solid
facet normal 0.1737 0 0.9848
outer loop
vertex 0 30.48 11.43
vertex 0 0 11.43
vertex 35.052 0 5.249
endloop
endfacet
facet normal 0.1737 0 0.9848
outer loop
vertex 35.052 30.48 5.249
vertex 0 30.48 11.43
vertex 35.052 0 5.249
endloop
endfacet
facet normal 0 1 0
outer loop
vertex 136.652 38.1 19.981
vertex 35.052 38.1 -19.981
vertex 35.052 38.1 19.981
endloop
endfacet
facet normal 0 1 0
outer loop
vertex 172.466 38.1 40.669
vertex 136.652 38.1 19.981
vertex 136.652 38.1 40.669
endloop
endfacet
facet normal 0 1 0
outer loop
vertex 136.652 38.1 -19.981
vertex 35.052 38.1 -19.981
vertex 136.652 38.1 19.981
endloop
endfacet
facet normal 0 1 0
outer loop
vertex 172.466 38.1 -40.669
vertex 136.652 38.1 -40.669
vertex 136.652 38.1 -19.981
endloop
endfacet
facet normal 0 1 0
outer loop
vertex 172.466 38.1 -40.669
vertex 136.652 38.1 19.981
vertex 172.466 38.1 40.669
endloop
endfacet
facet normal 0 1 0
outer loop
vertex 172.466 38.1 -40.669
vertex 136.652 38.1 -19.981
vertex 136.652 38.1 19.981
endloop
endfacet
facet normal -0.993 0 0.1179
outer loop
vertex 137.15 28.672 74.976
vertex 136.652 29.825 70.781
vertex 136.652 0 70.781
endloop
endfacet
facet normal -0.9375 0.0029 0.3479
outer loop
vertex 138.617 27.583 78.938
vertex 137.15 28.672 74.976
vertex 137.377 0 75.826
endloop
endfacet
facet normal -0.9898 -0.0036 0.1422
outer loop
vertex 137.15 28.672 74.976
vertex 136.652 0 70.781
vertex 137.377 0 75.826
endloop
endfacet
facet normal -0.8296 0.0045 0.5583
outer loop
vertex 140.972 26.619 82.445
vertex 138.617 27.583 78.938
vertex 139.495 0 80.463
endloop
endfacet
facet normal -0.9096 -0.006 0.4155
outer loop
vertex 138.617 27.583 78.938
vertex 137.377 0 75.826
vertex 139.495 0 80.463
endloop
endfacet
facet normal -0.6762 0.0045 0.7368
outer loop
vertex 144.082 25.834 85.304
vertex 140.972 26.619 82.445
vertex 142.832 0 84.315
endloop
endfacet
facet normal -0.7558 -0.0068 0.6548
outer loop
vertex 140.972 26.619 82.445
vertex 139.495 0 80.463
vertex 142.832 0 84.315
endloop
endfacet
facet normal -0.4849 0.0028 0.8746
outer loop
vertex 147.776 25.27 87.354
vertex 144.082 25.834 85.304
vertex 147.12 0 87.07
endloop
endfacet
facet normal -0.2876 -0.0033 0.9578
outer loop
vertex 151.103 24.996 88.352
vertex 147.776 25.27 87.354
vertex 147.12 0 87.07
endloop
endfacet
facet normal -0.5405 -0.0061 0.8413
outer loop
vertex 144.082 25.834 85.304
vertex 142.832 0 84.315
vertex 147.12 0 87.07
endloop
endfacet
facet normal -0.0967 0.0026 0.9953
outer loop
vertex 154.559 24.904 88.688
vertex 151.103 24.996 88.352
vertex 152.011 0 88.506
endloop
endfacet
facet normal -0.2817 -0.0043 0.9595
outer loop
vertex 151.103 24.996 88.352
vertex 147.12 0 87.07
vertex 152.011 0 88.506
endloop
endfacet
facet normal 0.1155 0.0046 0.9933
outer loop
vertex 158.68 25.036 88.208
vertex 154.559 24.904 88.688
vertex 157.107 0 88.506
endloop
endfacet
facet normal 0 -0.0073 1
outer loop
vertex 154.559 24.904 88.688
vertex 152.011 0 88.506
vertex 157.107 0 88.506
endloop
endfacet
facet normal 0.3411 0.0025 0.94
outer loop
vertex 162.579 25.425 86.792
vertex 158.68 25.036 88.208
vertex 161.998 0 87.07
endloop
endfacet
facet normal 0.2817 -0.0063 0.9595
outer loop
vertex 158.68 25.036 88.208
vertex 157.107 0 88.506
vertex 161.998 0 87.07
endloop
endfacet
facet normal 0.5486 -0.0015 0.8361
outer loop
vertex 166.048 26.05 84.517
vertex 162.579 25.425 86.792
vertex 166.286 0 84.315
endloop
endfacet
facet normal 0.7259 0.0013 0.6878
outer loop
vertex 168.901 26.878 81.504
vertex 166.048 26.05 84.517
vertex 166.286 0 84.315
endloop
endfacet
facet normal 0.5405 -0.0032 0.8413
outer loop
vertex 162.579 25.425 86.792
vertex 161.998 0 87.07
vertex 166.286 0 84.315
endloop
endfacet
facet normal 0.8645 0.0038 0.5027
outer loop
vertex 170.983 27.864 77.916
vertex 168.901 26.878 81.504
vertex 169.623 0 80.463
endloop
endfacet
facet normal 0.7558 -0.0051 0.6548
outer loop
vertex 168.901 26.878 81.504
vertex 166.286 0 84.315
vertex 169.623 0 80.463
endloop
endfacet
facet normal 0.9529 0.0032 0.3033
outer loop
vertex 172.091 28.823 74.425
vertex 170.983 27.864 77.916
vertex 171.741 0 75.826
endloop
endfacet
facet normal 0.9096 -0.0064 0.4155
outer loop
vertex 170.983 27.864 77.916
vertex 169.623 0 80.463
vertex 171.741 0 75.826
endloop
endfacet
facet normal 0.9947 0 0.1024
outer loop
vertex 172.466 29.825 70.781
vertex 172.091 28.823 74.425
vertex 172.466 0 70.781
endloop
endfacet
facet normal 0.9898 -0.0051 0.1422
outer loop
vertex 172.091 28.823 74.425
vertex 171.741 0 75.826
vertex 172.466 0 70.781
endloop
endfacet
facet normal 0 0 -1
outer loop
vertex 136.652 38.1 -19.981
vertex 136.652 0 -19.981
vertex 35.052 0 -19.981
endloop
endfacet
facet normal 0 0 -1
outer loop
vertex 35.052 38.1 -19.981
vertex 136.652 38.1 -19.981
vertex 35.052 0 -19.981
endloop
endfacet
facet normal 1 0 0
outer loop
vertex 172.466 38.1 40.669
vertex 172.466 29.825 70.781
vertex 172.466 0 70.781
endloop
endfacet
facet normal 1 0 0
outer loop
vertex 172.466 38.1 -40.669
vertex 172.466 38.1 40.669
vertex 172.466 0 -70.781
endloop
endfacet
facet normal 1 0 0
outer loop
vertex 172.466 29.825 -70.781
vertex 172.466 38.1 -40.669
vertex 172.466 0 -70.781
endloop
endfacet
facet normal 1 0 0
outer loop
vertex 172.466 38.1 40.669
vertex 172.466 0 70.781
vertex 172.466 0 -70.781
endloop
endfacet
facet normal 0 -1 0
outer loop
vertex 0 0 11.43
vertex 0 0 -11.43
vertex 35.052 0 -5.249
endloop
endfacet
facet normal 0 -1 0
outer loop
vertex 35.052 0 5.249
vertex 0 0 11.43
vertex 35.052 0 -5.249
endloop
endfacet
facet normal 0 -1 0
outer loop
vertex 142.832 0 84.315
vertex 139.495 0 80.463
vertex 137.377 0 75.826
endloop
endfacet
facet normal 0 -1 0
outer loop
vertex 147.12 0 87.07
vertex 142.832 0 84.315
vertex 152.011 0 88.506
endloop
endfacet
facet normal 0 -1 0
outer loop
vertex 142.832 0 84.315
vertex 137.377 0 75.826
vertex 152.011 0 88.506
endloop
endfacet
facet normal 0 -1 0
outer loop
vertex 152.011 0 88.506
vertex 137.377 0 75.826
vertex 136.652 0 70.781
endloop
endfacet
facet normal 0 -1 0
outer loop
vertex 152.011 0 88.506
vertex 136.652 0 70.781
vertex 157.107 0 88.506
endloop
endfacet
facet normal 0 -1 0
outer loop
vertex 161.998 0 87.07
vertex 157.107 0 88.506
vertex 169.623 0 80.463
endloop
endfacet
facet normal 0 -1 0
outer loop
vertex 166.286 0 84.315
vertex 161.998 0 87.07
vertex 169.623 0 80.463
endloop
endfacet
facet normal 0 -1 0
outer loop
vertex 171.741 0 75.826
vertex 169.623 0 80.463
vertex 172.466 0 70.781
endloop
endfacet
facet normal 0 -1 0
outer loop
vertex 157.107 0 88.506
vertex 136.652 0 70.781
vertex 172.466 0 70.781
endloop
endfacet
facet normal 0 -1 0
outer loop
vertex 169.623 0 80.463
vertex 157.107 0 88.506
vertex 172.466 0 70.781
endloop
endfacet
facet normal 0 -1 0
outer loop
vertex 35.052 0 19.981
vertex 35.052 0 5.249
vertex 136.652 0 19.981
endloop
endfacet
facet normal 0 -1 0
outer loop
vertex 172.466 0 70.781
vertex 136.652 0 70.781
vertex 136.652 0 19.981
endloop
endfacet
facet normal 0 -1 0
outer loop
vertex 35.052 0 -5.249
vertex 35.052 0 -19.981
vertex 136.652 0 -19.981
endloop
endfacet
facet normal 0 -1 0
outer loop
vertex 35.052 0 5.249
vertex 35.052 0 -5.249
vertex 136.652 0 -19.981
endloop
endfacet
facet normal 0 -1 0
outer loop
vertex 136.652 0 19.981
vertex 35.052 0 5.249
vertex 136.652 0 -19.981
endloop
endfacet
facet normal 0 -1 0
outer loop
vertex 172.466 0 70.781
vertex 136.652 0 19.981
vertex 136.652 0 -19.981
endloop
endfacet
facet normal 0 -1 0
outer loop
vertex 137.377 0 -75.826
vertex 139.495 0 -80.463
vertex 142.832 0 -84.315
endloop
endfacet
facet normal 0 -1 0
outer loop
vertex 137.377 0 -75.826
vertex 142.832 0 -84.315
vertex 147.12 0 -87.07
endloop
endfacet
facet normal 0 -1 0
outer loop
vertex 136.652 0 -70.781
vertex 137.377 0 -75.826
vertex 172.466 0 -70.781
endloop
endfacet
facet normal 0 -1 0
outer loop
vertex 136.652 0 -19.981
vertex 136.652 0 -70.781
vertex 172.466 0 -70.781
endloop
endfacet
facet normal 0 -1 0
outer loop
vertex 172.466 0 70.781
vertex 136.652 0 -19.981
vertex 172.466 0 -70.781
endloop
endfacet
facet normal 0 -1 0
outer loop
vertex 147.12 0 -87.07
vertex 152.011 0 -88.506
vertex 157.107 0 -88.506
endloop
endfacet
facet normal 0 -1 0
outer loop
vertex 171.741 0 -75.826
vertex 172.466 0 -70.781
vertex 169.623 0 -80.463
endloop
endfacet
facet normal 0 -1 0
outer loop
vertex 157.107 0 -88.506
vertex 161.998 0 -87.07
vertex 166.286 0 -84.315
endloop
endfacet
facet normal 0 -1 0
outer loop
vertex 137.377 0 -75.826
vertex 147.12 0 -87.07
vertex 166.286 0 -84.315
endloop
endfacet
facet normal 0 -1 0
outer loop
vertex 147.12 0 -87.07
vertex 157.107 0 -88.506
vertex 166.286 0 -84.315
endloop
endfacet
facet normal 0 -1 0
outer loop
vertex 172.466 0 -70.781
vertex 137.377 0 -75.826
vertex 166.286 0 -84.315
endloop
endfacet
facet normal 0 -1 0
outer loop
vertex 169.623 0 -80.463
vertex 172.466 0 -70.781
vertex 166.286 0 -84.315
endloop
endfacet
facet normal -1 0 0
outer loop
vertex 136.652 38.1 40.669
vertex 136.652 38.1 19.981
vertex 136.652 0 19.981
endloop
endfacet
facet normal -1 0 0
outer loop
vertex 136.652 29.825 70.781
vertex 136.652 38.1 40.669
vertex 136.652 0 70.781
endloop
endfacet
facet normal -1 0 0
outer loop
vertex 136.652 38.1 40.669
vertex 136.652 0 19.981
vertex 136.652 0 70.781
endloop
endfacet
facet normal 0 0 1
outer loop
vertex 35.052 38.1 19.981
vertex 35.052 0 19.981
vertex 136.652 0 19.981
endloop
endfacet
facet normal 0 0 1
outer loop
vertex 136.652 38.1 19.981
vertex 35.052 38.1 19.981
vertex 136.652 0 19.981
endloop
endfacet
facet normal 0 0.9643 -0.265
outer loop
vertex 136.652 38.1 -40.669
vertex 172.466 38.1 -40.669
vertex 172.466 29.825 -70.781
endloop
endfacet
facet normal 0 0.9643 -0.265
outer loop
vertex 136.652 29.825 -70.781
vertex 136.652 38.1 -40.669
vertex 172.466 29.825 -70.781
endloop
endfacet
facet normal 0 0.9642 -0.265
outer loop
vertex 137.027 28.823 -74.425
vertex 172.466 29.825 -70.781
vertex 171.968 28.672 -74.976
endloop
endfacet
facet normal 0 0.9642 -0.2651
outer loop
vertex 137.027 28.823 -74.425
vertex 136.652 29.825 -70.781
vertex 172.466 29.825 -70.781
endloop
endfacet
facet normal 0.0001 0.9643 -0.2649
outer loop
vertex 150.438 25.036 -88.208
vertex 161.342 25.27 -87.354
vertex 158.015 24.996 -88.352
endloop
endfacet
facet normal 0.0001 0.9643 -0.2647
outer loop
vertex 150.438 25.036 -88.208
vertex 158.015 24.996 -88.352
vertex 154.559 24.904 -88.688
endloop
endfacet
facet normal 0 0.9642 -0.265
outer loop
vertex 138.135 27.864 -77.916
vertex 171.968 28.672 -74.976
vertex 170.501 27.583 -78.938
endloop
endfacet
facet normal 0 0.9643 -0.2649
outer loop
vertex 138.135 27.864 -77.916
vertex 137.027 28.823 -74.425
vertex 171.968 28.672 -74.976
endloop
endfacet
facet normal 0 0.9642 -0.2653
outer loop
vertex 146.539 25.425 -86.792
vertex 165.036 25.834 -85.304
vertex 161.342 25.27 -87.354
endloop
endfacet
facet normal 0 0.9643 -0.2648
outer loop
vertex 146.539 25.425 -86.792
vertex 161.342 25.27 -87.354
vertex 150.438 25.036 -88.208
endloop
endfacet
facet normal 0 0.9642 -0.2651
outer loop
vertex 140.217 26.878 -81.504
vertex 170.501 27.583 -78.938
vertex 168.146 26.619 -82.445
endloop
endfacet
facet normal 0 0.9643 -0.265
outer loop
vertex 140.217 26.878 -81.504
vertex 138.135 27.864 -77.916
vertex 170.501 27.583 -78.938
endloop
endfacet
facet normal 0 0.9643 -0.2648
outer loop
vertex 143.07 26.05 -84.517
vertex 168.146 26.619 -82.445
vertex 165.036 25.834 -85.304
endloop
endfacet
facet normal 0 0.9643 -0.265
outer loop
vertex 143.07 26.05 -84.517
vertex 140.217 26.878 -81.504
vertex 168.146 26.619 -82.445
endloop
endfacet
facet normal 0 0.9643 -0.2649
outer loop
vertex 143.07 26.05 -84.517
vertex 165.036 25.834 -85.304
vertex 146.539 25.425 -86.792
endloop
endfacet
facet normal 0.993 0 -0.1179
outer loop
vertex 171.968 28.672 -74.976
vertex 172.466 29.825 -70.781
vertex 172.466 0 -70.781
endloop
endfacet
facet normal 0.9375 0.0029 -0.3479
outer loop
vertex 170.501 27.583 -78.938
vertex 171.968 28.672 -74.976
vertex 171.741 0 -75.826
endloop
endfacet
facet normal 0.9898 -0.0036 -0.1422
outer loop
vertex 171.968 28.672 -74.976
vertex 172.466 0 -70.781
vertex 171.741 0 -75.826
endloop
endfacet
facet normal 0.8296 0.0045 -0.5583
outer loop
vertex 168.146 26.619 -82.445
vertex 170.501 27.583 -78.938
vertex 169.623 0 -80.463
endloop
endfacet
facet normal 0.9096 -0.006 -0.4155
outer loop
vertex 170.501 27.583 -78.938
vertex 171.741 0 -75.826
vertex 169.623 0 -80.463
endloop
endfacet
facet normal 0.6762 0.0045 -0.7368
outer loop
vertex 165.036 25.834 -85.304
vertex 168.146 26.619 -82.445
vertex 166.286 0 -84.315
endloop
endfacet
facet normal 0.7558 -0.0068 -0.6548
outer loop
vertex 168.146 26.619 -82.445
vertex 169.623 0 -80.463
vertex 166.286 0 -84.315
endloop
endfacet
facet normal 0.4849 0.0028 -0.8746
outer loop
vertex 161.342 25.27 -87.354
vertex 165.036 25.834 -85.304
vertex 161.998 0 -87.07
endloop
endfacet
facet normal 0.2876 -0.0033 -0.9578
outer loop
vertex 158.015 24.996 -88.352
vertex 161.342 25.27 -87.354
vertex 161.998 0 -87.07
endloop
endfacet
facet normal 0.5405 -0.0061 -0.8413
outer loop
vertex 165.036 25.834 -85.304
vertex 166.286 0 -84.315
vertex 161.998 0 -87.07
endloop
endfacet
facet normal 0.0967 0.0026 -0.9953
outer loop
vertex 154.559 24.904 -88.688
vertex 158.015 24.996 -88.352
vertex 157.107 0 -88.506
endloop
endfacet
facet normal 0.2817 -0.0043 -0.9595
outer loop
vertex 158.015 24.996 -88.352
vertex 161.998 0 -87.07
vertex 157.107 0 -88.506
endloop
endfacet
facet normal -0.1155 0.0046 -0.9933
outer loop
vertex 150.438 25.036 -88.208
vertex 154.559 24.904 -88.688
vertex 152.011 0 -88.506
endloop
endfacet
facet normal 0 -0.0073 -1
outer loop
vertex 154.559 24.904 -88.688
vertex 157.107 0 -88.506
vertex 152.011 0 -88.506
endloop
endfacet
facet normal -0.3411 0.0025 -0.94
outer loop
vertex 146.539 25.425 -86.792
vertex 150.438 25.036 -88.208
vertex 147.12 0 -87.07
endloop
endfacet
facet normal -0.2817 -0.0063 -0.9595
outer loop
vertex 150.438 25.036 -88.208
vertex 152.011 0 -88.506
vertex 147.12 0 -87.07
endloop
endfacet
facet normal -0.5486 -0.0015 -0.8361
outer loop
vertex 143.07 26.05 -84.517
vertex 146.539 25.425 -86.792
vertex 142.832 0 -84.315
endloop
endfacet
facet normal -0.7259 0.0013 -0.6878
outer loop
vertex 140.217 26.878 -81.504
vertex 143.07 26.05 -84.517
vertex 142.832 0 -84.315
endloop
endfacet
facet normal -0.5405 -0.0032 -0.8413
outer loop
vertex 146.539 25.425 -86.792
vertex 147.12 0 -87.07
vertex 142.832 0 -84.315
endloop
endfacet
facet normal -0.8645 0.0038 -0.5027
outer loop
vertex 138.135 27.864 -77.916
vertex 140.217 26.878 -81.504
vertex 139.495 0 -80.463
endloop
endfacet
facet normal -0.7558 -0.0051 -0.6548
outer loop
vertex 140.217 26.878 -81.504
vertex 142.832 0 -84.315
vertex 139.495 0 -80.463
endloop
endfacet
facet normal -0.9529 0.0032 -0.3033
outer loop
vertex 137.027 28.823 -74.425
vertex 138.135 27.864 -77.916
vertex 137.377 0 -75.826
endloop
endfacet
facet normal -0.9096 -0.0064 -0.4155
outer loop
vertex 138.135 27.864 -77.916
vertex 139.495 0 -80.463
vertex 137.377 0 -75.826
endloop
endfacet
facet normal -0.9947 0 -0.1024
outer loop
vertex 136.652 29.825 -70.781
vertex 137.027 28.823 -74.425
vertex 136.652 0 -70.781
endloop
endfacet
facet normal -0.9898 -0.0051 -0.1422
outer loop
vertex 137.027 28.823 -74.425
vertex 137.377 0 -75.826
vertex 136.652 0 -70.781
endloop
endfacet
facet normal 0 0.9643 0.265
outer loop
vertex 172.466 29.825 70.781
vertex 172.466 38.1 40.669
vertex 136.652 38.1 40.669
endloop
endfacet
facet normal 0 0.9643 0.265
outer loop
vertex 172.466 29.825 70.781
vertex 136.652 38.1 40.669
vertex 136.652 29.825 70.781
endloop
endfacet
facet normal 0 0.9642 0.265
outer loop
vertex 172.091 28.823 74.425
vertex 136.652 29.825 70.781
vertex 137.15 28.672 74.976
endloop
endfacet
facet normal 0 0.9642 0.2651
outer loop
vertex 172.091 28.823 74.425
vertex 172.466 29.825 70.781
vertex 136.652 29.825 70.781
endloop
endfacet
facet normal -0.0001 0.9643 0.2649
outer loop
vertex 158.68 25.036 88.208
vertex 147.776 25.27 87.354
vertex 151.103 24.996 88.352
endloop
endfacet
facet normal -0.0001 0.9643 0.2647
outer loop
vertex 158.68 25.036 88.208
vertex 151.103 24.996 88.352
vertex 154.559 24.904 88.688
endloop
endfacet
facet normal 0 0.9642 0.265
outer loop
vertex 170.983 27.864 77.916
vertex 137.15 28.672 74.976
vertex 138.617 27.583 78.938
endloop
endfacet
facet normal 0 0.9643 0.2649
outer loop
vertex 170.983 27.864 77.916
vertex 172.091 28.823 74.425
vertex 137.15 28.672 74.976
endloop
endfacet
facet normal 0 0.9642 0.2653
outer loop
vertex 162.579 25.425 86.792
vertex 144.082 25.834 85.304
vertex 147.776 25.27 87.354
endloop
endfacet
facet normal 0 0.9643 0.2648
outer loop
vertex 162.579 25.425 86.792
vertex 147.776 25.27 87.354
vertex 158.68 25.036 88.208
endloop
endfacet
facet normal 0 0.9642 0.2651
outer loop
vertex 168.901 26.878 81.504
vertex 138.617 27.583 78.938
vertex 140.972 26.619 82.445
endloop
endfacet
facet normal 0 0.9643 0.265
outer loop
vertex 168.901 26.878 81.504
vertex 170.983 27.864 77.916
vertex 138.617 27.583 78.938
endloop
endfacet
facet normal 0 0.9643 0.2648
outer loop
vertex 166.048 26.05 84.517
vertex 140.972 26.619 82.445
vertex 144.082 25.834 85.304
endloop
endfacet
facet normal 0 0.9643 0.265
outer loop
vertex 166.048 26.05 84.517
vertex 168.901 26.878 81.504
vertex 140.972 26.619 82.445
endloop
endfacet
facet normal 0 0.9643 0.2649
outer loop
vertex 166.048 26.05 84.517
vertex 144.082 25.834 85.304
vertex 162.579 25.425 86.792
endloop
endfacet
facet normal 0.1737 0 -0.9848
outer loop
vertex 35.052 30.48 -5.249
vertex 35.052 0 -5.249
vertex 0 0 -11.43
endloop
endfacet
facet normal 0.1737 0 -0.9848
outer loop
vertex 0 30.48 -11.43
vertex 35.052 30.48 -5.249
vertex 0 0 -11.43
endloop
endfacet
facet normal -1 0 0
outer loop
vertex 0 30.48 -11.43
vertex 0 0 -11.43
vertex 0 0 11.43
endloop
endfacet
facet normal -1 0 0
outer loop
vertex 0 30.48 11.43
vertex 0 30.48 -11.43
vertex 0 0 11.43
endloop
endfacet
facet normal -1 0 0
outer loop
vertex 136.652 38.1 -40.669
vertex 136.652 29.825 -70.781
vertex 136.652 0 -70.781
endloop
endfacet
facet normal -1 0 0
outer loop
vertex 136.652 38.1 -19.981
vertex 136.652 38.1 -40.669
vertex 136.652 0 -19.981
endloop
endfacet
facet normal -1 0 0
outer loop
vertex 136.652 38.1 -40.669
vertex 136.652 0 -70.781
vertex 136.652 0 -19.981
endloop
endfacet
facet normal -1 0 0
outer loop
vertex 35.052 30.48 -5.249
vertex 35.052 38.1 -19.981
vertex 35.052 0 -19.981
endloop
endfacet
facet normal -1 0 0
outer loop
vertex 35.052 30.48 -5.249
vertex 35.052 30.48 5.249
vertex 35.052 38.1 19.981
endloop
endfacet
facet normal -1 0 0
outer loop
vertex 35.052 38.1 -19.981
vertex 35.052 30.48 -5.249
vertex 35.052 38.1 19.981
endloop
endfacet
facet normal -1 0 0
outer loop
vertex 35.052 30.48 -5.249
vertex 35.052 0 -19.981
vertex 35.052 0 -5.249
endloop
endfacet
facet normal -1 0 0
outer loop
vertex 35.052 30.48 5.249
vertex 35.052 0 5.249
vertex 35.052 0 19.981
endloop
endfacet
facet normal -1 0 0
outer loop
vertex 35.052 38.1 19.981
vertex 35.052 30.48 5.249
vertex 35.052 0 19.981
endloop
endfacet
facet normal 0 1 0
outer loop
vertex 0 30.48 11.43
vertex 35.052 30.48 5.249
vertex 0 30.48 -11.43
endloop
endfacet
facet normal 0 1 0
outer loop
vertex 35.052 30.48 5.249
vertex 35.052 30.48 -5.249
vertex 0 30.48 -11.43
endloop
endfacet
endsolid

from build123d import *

# Parameters (mm, degrees)
BOSS_EXTRUDE1_DEPTH     = 38.1
CUT_EXTRUDE_THIN5_DEPTH = 35.814
CUT_EXTRUDE9_DEPTH      = 198.640484432
CUT_EXTRUDE9_DEPTH_BACK = 35.814
CUT_EXTRUDE10_DEPTH     = 7.62


with BuildPart() as part:
    # Sketch1 → Boss-Extrude1 (new body)
    with BuildSketch(Plane(origin=(0, 0, 0), x_dir=(1, 0, 0), z_dir=(0, 1, 0))):
        with BuildLine():
            Line((0, 11.43), (0, -11.43))
            Line((0, -11.43), (35.052, -5.249386672))
            Line((35.052, -5.249386672), (35.052, -19.981386672))
            Line((35.052, -19.981386672), (136.652, -19.981386672))
            Line((136.652, -19.981386672), (136.652, -70.781386672))
            ThreePointArc((136.652, -70.781386672), (154.559, -88.688386672), (172.466, -70.781386672))
            Line((172.466, -70.781386672), (172.466, 70.781386672))
            ThreePointArc((172.466, 70.781386672), (154.559, 88.688386672), (136.652, 70.781386672))
            Line((136.652, 70.781386672), (136.652, 19.981386672))
            Line((136.652, 19.981386672), (35.052, 19.981386672))
            Line((35.052, 19.981386672), (35.052, 5.249386672))
            Line((35.052, 5.249386672), (0, 11.43))
        make_face()
    extrude(amount=BOSS_EXTRUDE1_DEPTH)

    # Sketch3 → Cut-Extrude-Thin5 (cut)
    with BuildSketch(Plane(origin=(172.466, 0, 0), x_dir=(0, 0, -1), z_dir=(1, 0, 0))):
        Polygon((-40.668819045, 38.1), (-88.688386672, 24.903727481), (-102.149697549, 73.887736193), (-54.130129922, 87.084008712), align=None)
    extrude(amount=-CUT_EXTRUDE_THIN5_DEPTH, mode=Mode.SUBTRACT)

    # Sketch4 → Cut-Extrude9 (cut, two sides: drawn at the far end of the back side and taken through both)
    with BuildSketch(Plane(origin=(172.466, 0, 0), x_dir=(0, 0, -1), z_dir=(1, 0, 0)).offset(-CUT_EXTRUDE9_DEPTH_BACK)):
        Polygon((-314.400611186, 135.676742064), (40.668819045, 38.1), (88.688386672, 24.903727481), (443.757816904, -72.673014582), (638.911301031, 637.465845881), (-119.247127059, 845.815602527), align=None)
    extrude(amount=CUT_EXTRUDE9_DEPTH + CUT_EXTRUDE9_DEPTH_BACK, mode=Mode.SUBTRACT)

    # Sketch5 → Cut-Extrude10 (cut)
    with BuildSketch(Plane(origin=(0, 38.1, 0), x_dir=(1, 0, 0), z_dir=(0, 1, 0))):
        Polygon((0, -11.43), (0, 11.43), (0.210478784, 11.603037745), (35.052, 5.249386672), (35.052, -5.249386672), align=None)
    extrude(amount=-CUT_EXTRUDE10_DEPTH, mode=Mode.SUBTRACT)


solid = part.part
